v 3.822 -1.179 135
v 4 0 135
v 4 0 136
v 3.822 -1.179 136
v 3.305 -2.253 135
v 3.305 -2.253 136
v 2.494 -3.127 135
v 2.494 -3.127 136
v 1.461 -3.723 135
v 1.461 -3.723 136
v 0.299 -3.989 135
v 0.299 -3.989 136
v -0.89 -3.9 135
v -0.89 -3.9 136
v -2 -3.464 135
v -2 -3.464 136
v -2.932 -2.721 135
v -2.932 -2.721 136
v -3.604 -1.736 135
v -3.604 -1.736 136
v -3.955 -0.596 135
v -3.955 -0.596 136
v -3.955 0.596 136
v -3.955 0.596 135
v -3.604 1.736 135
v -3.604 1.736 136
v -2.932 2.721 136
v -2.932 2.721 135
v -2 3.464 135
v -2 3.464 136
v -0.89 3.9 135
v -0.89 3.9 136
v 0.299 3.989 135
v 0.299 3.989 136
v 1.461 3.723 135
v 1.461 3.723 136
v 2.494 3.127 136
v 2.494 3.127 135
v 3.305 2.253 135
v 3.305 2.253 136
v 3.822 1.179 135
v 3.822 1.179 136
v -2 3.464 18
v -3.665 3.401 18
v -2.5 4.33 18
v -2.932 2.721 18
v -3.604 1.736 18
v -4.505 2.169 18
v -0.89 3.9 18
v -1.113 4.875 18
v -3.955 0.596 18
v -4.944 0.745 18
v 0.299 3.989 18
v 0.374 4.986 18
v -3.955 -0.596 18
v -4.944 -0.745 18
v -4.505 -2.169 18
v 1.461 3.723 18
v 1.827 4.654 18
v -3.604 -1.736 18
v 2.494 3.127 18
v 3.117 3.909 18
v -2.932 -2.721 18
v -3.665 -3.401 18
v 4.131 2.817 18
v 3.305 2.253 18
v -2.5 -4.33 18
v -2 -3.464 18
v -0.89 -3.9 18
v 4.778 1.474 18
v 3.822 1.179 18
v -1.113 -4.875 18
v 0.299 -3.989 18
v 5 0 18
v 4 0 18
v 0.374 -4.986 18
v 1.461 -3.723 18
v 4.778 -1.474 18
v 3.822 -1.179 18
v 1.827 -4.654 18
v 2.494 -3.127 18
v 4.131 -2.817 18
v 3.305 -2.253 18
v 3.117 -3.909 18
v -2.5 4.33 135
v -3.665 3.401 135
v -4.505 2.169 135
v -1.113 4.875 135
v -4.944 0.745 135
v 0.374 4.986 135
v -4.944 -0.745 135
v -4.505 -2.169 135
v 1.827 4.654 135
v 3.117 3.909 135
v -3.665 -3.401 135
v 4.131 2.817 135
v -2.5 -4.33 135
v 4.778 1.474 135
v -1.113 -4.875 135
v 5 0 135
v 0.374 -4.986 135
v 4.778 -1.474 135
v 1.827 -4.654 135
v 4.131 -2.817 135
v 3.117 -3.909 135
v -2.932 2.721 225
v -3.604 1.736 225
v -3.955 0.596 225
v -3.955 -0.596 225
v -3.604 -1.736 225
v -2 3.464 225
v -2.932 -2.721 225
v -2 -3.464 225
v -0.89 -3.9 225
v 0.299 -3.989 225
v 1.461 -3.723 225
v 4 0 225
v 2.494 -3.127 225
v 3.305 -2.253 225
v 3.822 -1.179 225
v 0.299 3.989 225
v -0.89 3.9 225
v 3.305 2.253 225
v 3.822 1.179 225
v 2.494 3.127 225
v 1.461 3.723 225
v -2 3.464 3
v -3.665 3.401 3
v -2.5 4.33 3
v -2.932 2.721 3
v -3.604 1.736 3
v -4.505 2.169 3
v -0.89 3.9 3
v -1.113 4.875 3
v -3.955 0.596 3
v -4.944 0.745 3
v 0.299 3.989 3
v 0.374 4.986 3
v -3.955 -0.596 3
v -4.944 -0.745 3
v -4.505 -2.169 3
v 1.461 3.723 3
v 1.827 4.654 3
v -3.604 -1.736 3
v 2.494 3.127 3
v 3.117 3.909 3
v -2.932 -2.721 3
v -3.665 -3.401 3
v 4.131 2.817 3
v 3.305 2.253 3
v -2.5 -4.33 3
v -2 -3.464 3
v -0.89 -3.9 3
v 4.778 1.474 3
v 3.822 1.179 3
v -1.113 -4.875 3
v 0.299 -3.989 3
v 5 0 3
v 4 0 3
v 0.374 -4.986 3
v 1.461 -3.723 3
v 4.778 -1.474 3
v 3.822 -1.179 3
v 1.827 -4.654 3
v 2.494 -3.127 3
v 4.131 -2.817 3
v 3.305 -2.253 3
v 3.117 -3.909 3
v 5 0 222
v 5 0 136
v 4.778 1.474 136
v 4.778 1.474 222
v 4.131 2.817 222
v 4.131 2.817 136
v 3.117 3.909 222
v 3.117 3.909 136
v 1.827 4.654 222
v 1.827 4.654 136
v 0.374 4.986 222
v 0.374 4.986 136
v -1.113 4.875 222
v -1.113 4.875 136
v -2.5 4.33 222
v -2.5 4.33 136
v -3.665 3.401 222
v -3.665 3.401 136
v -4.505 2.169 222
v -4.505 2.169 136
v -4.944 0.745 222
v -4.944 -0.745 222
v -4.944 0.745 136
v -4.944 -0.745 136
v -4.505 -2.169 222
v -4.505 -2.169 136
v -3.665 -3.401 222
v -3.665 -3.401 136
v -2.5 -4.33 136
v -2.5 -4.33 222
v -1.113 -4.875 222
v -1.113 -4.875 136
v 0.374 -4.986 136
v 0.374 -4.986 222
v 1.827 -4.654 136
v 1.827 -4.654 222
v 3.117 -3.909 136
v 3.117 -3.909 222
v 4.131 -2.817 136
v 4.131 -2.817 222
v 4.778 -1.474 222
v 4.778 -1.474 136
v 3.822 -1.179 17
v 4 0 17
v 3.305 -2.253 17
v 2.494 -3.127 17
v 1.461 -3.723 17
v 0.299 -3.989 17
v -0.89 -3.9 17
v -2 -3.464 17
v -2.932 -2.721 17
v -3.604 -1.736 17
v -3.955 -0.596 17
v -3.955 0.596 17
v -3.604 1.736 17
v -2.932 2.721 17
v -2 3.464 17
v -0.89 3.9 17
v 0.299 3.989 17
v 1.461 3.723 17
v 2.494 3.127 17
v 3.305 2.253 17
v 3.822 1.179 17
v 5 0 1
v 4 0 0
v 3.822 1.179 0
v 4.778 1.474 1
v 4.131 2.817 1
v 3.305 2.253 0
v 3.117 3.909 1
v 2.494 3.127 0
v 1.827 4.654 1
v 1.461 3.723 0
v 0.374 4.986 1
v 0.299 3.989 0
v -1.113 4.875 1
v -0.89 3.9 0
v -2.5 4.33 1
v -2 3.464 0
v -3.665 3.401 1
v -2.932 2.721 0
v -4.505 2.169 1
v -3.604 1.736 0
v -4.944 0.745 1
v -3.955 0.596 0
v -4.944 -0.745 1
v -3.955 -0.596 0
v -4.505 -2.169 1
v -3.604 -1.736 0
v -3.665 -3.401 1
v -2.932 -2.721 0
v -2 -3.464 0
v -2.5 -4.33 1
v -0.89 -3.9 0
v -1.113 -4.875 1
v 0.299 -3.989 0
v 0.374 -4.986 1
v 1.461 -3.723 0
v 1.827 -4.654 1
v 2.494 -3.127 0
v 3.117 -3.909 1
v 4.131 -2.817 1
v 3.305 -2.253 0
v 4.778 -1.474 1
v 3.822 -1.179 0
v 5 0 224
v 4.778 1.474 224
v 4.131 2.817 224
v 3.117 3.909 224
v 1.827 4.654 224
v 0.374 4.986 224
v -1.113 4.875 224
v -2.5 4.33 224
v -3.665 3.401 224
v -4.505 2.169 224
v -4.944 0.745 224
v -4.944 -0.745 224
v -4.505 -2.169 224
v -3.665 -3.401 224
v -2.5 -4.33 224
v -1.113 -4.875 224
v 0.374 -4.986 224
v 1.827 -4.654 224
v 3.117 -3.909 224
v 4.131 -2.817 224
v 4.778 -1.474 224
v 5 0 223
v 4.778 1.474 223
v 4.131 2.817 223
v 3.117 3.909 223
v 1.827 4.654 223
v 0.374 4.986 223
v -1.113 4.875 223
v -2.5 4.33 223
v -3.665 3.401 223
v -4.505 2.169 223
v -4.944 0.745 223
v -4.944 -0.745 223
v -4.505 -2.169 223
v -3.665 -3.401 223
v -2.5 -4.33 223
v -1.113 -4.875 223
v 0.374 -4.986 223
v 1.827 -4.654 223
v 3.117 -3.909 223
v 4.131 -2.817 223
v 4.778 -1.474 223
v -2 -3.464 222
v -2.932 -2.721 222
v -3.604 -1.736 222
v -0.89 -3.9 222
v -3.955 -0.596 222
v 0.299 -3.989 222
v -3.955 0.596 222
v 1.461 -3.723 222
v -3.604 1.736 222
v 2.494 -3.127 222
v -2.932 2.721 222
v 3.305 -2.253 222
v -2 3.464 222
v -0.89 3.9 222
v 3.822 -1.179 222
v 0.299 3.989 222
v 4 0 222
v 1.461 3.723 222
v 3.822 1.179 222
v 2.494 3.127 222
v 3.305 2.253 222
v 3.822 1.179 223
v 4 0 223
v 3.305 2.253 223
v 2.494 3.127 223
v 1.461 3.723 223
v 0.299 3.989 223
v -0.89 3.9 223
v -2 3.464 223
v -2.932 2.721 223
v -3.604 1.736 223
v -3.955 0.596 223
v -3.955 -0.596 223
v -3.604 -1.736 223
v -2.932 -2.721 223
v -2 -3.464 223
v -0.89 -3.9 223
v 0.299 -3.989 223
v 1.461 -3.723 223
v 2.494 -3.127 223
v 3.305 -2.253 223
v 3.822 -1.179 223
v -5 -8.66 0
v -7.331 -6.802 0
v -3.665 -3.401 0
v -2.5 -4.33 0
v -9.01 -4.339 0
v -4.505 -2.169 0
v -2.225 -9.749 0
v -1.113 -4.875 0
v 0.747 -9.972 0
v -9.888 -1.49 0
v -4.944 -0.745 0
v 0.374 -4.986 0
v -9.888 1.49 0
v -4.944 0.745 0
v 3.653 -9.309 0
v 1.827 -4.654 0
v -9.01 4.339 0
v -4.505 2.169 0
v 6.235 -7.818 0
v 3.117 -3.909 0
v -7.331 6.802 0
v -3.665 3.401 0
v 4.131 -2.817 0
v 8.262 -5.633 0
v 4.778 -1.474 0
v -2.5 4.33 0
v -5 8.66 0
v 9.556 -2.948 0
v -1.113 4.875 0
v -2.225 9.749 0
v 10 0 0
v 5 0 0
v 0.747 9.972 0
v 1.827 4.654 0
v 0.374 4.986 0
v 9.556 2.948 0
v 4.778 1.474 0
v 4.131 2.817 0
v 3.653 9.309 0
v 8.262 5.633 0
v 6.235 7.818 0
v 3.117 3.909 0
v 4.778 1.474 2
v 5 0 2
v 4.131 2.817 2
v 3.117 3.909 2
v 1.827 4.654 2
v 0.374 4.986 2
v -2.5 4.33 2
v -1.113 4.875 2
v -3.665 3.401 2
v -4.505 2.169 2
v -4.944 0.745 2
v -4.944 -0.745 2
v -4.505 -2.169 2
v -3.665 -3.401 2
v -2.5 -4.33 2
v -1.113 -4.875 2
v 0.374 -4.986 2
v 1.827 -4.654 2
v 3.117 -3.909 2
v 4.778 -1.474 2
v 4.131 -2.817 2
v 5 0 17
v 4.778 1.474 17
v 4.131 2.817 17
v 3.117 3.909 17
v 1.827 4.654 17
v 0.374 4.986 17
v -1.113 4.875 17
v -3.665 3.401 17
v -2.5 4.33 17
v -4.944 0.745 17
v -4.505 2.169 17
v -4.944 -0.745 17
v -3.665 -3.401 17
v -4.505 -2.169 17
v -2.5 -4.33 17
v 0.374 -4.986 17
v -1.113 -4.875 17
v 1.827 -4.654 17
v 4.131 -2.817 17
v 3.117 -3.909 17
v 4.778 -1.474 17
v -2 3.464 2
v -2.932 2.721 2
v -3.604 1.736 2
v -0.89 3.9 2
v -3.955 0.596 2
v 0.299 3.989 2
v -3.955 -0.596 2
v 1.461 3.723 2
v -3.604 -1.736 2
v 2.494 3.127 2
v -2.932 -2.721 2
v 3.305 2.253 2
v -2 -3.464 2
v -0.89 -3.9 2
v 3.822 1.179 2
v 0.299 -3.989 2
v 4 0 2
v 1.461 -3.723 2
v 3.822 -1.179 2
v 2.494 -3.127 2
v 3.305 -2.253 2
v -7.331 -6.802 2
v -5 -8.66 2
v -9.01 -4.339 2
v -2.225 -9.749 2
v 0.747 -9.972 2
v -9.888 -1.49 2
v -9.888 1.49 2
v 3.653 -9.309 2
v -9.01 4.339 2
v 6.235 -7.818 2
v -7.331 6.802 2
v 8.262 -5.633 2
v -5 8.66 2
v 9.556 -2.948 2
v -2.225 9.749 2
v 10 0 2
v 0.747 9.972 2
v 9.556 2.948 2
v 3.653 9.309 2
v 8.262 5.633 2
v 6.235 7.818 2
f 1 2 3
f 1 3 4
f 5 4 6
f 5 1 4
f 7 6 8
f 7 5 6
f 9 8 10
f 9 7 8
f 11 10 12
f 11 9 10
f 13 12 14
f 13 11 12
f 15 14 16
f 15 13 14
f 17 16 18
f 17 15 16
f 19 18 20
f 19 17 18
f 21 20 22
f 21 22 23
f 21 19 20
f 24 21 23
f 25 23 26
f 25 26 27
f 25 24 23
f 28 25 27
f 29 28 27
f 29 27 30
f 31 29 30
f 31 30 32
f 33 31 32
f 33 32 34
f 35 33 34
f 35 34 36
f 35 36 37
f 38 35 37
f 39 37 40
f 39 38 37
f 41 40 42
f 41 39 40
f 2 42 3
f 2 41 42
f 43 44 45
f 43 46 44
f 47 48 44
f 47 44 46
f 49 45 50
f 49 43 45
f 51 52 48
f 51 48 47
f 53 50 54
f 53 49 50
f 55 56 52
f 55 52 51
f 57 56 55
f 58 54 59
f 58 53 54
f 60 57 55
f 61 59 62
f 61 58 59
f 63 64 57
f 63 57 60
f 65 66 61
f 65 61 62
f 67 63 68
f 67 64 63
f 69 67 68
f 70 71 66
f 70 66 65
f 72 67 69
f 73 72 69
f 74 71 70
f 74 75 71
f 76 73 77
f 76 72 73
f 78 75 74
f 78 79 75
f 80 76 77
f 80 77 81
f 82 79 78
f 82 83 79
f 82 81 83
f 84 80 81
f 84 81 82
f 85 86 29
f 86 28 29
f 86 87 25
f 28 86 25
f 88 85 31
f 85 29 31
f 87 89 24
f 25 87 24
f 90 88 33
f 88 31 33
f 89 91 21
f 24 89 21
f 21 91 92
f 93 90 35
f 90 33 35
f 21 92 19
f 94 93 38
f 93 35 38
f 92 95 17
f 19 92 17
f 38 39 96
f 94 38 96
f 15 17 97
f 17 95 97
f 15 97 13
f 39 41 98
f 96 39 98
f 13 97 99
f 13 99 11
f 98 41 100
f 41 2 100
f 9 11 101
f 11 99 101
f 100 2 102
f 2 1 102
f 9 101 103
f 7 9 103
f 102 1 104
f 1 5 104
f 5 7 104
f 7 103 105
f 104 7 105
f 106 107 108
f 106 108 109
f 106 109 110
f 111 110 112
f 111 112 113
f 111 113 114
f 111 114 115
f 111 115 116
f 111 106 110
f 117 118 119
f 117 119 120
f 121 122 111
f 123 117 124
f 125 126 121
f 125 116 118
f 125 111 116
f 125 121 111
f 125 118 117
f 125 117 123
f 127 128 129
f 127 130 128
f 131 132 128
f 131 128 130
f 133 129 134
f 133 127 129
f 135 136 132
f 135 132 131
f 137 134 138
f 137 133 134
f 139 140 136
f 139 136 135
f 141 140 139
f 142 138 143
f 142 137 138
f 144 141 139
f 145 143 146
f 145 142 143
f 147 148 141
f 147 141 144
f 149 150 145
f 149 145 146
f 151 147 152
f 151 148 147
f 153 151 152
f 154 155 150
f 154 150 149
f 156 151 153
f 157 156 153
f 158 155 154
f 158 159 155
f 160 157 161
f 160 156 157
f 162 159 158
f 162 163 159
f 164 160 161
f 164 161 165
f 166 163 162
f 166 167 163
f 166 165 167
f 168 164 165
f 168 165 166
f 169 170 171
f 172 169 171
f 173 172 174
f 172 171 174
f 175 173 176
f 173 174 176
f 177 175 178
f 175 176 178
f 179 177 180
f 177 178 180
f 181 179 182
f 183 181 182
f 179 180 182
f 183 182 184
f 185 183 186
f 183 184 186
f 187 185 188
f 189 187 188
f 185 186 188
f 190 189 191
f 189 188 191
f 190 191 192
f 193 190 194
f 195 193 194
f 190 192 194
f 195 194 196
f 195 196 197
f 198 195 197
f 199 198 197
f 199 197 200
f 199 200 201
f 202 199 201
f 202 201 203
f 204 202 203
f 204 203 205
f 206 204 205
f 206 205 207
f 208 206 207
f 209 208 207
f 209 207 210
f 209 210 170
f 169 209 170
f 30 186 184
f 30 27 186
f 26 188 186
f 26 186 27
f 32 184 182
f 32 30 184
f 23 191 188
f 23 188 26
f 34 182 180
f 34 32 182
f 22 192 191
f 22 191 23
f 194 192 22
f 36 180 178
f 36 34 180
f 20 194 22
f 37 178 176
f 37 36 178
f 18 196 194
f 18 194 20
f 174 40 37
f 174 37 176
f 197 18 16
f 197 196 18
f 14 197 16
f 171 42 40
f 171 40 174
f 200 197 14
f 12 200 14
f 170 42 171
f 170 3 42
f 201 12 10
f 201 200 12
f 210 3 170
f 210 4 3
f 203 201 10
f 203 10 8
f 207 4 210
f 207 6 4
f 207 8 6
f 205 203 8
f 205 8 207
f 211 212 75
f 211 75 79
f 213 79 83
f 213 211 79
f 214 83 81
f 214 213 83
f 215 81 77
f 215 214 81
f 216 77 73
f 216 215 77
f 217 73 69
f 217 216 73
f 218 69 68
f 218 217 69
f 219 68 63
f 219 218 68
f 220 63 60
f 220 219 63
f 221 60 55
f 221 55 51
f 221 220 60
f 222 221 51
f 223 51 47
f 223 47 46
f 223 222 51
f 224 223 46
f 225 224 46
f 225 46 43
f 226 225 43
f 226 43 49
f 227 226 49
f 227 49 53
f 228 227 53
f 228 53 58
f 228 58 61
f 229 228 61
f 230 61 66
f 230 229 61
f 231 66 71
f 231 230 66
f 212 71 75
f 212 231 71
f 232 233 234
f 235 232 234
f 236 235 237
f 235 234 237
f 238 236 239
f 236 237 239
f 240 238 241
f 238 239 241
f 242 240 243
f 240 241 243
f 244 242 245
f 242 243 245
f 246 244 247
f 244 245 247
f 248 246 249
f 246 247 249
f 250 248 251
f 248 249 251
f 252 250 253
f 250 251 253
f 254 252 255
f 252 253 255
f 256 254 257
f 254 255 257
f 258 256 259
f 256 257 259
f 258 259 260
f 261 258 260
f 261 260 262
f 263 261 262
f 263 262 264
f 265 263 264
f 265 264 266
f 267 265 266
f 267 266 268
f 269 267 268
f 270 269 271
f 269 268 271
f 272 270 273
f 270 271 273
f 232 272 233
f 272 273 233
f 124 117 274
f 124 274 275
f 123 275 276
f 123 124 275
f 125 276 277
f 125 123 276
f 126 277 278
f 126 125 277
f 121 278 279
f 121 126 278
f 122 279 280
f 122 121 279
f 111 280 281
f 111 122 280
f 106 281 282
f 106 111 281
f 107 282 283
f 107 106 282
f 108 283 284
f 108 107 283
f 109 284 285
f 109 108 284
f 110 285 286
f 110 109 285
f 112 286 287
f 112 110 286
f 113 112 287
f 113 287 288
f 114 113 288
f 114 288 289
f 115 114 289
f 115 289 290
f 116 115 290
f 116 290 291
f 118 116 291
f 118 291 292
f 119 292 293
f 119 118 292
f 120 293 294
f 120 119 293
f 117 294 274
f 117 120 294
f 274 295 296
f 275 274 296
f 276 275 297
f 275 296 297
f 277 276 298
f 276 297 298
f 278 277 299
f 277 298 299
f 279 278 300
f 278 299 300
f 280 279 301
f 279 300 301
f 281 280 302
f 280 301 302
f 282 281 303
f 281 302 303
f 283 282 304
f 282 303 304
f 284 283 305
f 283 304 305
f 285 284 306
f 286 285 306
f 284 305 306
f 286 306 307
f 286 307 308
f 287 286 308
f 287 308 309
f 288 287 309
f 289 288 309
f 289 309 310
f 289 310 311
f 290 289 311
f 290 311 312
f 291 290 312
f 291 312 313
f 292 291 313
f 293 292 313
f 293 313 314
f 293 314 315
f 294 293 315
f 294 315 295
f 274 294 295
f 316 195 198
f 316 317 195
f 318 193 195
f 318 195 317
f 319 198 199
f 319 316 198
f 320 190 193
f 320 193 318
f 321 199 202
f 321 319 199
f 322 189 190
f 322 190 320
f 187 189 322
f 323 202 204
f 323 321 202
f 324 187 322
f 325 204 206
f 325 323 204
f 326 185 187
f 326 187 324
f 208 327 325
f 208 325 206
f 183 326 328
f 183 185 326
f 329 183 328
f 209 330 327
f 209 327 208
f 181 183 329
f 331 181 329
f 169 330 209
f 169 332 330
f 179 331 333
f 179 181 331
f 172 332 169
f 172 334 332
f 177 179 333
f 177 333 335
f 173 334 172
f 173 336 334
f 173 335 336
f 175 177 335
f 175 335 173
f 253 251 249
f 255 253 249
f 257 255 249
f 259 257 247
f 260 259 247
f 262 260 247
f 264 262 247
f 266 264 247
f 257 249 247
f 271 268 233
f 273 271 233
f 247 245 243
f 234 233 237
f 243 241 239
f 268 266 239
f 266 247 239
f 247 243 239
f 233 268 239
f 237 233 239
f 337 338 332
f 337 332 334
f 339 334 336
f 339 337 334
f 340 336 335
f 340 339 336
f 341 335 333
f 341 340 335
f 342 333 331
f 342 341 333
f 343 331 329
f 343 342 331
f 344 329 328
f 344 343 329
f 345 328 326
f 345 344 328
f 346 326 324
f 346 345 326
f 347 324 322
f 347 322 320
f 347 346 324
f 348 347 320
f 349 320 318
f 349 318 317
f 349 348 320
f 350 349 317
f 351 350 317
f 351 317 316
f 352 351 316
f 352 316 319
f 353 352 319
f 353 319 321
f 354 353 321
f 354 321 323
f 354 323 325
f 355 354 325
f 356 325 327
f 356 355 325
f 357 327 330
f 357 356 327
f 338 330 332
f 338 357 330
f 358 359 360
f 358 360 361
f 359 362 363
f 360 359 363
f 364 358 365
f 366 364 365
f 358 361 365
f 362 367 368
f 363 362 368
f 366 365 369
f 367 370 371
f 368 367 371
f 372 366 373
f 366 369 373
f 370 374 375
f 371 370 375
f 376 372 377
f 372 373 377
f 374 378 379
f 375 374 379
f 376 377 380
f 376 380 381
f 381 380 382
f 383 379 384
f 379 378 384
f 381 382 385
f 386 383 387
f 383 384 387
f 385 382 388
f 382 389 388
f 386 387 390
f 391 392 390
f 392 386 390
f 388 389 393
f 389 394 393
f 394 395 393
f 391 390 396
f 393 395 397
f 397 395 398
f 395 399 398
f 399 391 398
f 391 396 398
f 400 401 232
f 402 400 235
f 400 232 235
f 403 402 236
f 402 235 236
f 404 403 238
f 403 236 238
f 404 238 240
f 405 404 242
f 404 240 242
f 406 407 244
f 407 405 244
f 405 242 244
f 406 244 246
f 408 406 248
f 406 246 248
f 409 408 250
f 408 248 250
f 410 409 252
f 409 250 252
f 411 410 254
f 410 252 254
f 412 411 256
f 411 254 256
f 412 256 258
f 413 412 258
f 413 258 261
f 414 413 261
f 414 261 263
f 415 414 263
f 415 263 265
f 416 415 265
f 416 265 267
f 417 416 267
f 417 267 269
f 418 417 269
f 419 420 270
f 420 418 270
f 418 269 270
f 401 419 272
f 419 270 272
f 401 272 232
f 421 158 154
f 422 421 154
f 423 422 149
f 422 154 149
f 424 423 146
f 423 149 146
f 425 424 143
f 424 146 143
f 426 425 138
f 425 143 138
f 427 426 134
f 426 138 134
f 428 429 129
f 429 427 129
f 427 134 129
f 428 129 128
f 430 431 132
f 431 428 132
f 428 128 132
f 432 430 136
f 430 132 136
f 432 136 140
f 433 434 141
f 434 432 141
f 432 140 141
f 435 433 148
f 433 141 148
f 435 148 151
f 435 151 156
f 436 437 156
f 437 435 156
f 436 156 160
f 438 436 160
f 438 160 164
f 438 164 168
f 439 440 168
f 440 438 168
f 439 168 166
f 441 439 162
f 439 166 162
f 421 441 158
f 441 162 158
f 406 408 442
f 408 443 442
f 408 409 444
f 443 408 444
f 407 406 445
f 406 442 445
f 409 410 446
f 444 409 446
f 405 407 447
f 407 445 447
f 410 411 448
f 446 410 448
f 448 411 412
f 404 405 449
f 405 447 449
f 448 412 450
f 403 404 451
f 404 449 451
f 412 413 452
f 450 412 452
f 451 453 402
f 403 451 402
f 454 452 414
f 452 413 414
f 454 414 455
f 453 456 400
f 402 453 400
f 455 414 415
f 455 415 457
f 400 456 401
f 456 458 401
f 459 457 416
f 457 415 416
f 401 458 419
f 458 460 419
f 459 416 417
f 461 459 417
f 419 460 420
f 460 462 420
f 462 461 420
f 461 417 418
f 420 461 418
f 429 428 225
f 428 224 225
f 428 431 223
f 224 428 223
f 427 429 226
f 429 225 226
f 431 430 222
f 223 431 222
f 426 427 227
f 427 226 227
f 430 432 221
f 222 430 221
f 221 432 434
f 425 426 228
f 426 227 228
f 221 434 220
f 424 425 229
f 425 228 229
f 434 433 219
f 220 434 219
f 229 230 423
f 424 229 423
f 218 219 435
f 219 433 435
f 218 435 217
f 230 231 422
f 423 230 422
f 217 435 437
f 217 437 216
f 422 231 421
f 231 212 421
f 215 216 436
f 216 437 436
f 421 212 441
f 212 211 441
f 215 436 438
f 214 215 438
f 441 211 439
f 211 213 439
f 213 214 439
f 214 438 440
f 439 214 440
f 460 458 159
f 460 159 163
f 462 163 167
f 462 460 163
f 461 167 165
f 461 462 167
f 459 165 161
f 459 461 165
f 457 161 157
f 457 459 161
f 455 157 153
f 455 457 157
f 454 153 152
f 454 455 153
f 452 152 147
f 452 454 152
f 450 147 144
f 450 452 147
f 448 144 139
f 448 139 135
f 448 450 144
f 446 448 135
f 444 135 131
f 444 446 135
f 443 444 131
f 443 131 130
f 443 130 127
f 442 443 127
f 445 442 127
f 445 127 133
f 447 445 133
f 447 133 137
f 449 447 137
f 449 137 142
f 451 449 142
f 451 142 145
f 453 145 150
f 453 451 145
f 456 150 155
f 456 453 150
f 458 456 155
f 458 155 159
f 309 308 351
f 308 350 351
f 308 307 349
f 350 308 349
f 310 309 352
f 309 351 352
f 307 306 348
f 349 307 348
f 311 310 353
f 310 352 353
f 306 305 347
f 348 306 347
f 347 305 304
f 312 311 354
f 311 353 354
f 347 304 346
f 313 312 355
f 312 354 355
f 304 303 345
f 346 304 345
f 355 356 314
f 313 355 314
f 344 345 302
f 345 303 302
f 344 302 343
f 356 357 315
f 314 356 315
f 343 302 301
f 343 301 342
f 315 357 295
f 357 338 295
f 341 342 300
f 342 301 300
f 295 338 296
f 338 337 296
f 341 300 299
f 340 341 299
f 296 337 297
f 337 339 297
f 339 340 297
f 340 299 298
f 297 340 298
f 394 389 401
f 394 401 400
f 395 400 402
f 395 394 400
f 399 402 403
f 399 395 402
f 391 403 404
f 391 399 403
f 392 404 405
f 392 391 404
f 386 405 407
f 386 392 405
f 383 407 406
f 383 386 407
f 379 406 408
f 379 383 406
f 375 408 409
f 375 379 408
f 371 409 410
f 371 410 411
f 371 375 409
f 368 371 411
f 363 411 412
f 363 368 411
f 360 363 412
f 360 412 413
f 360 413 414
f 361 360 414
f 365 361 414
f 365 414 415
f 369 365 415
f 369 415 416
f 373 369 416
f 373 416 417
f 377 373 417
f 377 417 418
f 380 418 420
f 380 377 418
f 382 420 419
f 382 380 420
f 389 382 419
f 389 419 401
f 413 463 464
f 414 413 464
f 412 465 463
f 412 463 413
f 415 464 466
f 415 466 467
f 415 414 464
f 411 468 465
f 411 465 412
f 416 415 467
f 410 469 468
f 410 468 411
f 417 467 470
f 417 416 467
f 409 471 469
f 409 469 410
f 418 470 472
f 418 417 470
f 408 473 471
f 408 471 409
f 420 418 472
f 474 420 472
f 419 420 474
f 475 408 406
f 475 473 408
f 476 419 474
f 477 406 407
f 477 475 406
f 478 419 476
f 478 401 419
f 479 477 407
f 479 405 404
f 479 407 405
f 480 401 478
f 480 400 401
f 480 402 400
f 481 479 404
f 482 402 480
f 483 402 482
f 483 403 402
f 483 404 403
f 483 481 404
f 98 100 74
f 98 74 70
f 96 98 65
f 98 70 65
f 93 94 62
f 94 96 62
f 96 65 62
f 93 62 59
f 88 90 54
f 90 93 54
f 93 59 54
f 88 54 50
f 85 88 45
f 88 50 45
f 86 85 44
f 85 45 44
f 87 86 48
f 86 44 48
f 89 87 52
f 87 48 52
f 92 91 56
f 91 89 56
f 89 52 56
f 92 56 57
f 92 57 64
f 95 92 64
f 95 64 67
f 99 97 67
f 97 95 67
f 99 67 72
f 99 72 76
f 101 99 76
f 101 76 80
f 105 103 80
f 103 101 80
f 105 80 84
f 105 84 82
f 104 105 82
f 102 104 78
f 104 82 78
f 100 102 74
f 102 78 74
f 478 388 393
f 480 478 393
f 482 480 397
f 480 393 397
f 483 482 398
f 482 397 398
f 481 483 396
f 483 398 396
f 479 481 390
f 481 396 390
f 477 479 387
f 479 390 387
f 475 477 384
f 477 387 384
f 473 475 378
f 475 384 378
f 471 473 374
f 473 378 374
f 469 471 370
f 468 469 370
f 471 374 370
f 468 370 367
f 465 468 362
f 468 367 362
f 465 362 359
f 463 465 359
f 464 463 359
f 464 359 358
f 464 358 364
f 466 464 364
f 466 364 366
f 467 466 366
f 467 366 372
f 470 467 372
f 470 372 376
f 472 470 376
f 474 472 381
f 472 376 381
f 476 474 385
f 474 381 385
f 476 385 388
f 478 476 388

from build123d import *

# Parameters (mm, degrees)
F0_R      = 5
F1_DEPTH  = 225
F2_SIZE   = 1
F4_R      = 5
F4_R_2    = 4
F5_DEPTH  = 1
F7_R      = 5
F7_R_2    = 4
F8_DEPTH  = 1
F10_R     = 5
F10_R_2   = 4
F11_DEPTH = 1
F13_R     = 5
F13_R_2   = 4
F14_DEPTH = 1
F15_R     = 10
F15_R_2   = 5
F16_DEPTH = 2


with BuildPart() as f1:
    # F0 (on Top) → F1 (new body)
    with BuildSketch(Plane.XY):
        Circle(F0_R)
    extrude(amount=F1_DEPTH)

    # F2
    f2_edges = [f1.edges().sort_by_distance(p)[0] for p in [
        (-5, 0, 225),
        (-5, 0, 0),
    ]]
    chamfer(f2_edges, length=F2_SIZE)

    # F4 (on offset) → F5 (cut)
    with BuildSketch(Plane(origin=(0, 0, 2), x_dir=(1, 0, 0), z_dir=(0, 0, -1))):
        Circle(F4_R)
        Circle(F4_R_2, mode=Mode.SUBTRACT)
    extrude(amount=-F5_DEPTH, mode=Mode.SUBTRACT)

    # F7 (on offset) → F8 (cut)
    with BuildSketch(Plane.XY.offset(223)):
        Circle(F7_R)
        Circle(F7_R_2, mode=Mode.SUBTRACT)
    extrude(amount=-F8_DEPTH, mode=Mode.SUBTRACT)

    # F10 (on offset) → F11 (cut)
    with BuildSketch(Plane(origin=(0, 0, 17), x_dir=(1, 0, 0), z_dir=(0, 0, -1))):
        Circle(F10_R)
        Circle(F10_R_2, mode=Mode.SUBTRACT)
    extrude(amount=-F11_DEPTH, mode=Mode.SUBTRACT)

    # F13 (on offset) → F14 (cut)
    with BuildSketch(Plane(origin=(0, 0, 135), x_dir=(1, 0, 0), z_dir=(0, 0, -1))):
        Circle(F13_R)
        Circle(F13_R_2, mode=Mode.SUBTRACT)
    extrude(amount=-F14_DEPTH, mode=Mode.SUBTRACT)


with BuildPart() as f16:
    # F15 (on Top) → F16 (new body)
    with BuildSketch(Plane.XY):
        Circle(F15_R)
        Circle(F15_R_2, mode=Mode.SUBTRACT)
    extrude(amount=F16_DEPTH)


solid = Compound([f1.part, f16.part])
